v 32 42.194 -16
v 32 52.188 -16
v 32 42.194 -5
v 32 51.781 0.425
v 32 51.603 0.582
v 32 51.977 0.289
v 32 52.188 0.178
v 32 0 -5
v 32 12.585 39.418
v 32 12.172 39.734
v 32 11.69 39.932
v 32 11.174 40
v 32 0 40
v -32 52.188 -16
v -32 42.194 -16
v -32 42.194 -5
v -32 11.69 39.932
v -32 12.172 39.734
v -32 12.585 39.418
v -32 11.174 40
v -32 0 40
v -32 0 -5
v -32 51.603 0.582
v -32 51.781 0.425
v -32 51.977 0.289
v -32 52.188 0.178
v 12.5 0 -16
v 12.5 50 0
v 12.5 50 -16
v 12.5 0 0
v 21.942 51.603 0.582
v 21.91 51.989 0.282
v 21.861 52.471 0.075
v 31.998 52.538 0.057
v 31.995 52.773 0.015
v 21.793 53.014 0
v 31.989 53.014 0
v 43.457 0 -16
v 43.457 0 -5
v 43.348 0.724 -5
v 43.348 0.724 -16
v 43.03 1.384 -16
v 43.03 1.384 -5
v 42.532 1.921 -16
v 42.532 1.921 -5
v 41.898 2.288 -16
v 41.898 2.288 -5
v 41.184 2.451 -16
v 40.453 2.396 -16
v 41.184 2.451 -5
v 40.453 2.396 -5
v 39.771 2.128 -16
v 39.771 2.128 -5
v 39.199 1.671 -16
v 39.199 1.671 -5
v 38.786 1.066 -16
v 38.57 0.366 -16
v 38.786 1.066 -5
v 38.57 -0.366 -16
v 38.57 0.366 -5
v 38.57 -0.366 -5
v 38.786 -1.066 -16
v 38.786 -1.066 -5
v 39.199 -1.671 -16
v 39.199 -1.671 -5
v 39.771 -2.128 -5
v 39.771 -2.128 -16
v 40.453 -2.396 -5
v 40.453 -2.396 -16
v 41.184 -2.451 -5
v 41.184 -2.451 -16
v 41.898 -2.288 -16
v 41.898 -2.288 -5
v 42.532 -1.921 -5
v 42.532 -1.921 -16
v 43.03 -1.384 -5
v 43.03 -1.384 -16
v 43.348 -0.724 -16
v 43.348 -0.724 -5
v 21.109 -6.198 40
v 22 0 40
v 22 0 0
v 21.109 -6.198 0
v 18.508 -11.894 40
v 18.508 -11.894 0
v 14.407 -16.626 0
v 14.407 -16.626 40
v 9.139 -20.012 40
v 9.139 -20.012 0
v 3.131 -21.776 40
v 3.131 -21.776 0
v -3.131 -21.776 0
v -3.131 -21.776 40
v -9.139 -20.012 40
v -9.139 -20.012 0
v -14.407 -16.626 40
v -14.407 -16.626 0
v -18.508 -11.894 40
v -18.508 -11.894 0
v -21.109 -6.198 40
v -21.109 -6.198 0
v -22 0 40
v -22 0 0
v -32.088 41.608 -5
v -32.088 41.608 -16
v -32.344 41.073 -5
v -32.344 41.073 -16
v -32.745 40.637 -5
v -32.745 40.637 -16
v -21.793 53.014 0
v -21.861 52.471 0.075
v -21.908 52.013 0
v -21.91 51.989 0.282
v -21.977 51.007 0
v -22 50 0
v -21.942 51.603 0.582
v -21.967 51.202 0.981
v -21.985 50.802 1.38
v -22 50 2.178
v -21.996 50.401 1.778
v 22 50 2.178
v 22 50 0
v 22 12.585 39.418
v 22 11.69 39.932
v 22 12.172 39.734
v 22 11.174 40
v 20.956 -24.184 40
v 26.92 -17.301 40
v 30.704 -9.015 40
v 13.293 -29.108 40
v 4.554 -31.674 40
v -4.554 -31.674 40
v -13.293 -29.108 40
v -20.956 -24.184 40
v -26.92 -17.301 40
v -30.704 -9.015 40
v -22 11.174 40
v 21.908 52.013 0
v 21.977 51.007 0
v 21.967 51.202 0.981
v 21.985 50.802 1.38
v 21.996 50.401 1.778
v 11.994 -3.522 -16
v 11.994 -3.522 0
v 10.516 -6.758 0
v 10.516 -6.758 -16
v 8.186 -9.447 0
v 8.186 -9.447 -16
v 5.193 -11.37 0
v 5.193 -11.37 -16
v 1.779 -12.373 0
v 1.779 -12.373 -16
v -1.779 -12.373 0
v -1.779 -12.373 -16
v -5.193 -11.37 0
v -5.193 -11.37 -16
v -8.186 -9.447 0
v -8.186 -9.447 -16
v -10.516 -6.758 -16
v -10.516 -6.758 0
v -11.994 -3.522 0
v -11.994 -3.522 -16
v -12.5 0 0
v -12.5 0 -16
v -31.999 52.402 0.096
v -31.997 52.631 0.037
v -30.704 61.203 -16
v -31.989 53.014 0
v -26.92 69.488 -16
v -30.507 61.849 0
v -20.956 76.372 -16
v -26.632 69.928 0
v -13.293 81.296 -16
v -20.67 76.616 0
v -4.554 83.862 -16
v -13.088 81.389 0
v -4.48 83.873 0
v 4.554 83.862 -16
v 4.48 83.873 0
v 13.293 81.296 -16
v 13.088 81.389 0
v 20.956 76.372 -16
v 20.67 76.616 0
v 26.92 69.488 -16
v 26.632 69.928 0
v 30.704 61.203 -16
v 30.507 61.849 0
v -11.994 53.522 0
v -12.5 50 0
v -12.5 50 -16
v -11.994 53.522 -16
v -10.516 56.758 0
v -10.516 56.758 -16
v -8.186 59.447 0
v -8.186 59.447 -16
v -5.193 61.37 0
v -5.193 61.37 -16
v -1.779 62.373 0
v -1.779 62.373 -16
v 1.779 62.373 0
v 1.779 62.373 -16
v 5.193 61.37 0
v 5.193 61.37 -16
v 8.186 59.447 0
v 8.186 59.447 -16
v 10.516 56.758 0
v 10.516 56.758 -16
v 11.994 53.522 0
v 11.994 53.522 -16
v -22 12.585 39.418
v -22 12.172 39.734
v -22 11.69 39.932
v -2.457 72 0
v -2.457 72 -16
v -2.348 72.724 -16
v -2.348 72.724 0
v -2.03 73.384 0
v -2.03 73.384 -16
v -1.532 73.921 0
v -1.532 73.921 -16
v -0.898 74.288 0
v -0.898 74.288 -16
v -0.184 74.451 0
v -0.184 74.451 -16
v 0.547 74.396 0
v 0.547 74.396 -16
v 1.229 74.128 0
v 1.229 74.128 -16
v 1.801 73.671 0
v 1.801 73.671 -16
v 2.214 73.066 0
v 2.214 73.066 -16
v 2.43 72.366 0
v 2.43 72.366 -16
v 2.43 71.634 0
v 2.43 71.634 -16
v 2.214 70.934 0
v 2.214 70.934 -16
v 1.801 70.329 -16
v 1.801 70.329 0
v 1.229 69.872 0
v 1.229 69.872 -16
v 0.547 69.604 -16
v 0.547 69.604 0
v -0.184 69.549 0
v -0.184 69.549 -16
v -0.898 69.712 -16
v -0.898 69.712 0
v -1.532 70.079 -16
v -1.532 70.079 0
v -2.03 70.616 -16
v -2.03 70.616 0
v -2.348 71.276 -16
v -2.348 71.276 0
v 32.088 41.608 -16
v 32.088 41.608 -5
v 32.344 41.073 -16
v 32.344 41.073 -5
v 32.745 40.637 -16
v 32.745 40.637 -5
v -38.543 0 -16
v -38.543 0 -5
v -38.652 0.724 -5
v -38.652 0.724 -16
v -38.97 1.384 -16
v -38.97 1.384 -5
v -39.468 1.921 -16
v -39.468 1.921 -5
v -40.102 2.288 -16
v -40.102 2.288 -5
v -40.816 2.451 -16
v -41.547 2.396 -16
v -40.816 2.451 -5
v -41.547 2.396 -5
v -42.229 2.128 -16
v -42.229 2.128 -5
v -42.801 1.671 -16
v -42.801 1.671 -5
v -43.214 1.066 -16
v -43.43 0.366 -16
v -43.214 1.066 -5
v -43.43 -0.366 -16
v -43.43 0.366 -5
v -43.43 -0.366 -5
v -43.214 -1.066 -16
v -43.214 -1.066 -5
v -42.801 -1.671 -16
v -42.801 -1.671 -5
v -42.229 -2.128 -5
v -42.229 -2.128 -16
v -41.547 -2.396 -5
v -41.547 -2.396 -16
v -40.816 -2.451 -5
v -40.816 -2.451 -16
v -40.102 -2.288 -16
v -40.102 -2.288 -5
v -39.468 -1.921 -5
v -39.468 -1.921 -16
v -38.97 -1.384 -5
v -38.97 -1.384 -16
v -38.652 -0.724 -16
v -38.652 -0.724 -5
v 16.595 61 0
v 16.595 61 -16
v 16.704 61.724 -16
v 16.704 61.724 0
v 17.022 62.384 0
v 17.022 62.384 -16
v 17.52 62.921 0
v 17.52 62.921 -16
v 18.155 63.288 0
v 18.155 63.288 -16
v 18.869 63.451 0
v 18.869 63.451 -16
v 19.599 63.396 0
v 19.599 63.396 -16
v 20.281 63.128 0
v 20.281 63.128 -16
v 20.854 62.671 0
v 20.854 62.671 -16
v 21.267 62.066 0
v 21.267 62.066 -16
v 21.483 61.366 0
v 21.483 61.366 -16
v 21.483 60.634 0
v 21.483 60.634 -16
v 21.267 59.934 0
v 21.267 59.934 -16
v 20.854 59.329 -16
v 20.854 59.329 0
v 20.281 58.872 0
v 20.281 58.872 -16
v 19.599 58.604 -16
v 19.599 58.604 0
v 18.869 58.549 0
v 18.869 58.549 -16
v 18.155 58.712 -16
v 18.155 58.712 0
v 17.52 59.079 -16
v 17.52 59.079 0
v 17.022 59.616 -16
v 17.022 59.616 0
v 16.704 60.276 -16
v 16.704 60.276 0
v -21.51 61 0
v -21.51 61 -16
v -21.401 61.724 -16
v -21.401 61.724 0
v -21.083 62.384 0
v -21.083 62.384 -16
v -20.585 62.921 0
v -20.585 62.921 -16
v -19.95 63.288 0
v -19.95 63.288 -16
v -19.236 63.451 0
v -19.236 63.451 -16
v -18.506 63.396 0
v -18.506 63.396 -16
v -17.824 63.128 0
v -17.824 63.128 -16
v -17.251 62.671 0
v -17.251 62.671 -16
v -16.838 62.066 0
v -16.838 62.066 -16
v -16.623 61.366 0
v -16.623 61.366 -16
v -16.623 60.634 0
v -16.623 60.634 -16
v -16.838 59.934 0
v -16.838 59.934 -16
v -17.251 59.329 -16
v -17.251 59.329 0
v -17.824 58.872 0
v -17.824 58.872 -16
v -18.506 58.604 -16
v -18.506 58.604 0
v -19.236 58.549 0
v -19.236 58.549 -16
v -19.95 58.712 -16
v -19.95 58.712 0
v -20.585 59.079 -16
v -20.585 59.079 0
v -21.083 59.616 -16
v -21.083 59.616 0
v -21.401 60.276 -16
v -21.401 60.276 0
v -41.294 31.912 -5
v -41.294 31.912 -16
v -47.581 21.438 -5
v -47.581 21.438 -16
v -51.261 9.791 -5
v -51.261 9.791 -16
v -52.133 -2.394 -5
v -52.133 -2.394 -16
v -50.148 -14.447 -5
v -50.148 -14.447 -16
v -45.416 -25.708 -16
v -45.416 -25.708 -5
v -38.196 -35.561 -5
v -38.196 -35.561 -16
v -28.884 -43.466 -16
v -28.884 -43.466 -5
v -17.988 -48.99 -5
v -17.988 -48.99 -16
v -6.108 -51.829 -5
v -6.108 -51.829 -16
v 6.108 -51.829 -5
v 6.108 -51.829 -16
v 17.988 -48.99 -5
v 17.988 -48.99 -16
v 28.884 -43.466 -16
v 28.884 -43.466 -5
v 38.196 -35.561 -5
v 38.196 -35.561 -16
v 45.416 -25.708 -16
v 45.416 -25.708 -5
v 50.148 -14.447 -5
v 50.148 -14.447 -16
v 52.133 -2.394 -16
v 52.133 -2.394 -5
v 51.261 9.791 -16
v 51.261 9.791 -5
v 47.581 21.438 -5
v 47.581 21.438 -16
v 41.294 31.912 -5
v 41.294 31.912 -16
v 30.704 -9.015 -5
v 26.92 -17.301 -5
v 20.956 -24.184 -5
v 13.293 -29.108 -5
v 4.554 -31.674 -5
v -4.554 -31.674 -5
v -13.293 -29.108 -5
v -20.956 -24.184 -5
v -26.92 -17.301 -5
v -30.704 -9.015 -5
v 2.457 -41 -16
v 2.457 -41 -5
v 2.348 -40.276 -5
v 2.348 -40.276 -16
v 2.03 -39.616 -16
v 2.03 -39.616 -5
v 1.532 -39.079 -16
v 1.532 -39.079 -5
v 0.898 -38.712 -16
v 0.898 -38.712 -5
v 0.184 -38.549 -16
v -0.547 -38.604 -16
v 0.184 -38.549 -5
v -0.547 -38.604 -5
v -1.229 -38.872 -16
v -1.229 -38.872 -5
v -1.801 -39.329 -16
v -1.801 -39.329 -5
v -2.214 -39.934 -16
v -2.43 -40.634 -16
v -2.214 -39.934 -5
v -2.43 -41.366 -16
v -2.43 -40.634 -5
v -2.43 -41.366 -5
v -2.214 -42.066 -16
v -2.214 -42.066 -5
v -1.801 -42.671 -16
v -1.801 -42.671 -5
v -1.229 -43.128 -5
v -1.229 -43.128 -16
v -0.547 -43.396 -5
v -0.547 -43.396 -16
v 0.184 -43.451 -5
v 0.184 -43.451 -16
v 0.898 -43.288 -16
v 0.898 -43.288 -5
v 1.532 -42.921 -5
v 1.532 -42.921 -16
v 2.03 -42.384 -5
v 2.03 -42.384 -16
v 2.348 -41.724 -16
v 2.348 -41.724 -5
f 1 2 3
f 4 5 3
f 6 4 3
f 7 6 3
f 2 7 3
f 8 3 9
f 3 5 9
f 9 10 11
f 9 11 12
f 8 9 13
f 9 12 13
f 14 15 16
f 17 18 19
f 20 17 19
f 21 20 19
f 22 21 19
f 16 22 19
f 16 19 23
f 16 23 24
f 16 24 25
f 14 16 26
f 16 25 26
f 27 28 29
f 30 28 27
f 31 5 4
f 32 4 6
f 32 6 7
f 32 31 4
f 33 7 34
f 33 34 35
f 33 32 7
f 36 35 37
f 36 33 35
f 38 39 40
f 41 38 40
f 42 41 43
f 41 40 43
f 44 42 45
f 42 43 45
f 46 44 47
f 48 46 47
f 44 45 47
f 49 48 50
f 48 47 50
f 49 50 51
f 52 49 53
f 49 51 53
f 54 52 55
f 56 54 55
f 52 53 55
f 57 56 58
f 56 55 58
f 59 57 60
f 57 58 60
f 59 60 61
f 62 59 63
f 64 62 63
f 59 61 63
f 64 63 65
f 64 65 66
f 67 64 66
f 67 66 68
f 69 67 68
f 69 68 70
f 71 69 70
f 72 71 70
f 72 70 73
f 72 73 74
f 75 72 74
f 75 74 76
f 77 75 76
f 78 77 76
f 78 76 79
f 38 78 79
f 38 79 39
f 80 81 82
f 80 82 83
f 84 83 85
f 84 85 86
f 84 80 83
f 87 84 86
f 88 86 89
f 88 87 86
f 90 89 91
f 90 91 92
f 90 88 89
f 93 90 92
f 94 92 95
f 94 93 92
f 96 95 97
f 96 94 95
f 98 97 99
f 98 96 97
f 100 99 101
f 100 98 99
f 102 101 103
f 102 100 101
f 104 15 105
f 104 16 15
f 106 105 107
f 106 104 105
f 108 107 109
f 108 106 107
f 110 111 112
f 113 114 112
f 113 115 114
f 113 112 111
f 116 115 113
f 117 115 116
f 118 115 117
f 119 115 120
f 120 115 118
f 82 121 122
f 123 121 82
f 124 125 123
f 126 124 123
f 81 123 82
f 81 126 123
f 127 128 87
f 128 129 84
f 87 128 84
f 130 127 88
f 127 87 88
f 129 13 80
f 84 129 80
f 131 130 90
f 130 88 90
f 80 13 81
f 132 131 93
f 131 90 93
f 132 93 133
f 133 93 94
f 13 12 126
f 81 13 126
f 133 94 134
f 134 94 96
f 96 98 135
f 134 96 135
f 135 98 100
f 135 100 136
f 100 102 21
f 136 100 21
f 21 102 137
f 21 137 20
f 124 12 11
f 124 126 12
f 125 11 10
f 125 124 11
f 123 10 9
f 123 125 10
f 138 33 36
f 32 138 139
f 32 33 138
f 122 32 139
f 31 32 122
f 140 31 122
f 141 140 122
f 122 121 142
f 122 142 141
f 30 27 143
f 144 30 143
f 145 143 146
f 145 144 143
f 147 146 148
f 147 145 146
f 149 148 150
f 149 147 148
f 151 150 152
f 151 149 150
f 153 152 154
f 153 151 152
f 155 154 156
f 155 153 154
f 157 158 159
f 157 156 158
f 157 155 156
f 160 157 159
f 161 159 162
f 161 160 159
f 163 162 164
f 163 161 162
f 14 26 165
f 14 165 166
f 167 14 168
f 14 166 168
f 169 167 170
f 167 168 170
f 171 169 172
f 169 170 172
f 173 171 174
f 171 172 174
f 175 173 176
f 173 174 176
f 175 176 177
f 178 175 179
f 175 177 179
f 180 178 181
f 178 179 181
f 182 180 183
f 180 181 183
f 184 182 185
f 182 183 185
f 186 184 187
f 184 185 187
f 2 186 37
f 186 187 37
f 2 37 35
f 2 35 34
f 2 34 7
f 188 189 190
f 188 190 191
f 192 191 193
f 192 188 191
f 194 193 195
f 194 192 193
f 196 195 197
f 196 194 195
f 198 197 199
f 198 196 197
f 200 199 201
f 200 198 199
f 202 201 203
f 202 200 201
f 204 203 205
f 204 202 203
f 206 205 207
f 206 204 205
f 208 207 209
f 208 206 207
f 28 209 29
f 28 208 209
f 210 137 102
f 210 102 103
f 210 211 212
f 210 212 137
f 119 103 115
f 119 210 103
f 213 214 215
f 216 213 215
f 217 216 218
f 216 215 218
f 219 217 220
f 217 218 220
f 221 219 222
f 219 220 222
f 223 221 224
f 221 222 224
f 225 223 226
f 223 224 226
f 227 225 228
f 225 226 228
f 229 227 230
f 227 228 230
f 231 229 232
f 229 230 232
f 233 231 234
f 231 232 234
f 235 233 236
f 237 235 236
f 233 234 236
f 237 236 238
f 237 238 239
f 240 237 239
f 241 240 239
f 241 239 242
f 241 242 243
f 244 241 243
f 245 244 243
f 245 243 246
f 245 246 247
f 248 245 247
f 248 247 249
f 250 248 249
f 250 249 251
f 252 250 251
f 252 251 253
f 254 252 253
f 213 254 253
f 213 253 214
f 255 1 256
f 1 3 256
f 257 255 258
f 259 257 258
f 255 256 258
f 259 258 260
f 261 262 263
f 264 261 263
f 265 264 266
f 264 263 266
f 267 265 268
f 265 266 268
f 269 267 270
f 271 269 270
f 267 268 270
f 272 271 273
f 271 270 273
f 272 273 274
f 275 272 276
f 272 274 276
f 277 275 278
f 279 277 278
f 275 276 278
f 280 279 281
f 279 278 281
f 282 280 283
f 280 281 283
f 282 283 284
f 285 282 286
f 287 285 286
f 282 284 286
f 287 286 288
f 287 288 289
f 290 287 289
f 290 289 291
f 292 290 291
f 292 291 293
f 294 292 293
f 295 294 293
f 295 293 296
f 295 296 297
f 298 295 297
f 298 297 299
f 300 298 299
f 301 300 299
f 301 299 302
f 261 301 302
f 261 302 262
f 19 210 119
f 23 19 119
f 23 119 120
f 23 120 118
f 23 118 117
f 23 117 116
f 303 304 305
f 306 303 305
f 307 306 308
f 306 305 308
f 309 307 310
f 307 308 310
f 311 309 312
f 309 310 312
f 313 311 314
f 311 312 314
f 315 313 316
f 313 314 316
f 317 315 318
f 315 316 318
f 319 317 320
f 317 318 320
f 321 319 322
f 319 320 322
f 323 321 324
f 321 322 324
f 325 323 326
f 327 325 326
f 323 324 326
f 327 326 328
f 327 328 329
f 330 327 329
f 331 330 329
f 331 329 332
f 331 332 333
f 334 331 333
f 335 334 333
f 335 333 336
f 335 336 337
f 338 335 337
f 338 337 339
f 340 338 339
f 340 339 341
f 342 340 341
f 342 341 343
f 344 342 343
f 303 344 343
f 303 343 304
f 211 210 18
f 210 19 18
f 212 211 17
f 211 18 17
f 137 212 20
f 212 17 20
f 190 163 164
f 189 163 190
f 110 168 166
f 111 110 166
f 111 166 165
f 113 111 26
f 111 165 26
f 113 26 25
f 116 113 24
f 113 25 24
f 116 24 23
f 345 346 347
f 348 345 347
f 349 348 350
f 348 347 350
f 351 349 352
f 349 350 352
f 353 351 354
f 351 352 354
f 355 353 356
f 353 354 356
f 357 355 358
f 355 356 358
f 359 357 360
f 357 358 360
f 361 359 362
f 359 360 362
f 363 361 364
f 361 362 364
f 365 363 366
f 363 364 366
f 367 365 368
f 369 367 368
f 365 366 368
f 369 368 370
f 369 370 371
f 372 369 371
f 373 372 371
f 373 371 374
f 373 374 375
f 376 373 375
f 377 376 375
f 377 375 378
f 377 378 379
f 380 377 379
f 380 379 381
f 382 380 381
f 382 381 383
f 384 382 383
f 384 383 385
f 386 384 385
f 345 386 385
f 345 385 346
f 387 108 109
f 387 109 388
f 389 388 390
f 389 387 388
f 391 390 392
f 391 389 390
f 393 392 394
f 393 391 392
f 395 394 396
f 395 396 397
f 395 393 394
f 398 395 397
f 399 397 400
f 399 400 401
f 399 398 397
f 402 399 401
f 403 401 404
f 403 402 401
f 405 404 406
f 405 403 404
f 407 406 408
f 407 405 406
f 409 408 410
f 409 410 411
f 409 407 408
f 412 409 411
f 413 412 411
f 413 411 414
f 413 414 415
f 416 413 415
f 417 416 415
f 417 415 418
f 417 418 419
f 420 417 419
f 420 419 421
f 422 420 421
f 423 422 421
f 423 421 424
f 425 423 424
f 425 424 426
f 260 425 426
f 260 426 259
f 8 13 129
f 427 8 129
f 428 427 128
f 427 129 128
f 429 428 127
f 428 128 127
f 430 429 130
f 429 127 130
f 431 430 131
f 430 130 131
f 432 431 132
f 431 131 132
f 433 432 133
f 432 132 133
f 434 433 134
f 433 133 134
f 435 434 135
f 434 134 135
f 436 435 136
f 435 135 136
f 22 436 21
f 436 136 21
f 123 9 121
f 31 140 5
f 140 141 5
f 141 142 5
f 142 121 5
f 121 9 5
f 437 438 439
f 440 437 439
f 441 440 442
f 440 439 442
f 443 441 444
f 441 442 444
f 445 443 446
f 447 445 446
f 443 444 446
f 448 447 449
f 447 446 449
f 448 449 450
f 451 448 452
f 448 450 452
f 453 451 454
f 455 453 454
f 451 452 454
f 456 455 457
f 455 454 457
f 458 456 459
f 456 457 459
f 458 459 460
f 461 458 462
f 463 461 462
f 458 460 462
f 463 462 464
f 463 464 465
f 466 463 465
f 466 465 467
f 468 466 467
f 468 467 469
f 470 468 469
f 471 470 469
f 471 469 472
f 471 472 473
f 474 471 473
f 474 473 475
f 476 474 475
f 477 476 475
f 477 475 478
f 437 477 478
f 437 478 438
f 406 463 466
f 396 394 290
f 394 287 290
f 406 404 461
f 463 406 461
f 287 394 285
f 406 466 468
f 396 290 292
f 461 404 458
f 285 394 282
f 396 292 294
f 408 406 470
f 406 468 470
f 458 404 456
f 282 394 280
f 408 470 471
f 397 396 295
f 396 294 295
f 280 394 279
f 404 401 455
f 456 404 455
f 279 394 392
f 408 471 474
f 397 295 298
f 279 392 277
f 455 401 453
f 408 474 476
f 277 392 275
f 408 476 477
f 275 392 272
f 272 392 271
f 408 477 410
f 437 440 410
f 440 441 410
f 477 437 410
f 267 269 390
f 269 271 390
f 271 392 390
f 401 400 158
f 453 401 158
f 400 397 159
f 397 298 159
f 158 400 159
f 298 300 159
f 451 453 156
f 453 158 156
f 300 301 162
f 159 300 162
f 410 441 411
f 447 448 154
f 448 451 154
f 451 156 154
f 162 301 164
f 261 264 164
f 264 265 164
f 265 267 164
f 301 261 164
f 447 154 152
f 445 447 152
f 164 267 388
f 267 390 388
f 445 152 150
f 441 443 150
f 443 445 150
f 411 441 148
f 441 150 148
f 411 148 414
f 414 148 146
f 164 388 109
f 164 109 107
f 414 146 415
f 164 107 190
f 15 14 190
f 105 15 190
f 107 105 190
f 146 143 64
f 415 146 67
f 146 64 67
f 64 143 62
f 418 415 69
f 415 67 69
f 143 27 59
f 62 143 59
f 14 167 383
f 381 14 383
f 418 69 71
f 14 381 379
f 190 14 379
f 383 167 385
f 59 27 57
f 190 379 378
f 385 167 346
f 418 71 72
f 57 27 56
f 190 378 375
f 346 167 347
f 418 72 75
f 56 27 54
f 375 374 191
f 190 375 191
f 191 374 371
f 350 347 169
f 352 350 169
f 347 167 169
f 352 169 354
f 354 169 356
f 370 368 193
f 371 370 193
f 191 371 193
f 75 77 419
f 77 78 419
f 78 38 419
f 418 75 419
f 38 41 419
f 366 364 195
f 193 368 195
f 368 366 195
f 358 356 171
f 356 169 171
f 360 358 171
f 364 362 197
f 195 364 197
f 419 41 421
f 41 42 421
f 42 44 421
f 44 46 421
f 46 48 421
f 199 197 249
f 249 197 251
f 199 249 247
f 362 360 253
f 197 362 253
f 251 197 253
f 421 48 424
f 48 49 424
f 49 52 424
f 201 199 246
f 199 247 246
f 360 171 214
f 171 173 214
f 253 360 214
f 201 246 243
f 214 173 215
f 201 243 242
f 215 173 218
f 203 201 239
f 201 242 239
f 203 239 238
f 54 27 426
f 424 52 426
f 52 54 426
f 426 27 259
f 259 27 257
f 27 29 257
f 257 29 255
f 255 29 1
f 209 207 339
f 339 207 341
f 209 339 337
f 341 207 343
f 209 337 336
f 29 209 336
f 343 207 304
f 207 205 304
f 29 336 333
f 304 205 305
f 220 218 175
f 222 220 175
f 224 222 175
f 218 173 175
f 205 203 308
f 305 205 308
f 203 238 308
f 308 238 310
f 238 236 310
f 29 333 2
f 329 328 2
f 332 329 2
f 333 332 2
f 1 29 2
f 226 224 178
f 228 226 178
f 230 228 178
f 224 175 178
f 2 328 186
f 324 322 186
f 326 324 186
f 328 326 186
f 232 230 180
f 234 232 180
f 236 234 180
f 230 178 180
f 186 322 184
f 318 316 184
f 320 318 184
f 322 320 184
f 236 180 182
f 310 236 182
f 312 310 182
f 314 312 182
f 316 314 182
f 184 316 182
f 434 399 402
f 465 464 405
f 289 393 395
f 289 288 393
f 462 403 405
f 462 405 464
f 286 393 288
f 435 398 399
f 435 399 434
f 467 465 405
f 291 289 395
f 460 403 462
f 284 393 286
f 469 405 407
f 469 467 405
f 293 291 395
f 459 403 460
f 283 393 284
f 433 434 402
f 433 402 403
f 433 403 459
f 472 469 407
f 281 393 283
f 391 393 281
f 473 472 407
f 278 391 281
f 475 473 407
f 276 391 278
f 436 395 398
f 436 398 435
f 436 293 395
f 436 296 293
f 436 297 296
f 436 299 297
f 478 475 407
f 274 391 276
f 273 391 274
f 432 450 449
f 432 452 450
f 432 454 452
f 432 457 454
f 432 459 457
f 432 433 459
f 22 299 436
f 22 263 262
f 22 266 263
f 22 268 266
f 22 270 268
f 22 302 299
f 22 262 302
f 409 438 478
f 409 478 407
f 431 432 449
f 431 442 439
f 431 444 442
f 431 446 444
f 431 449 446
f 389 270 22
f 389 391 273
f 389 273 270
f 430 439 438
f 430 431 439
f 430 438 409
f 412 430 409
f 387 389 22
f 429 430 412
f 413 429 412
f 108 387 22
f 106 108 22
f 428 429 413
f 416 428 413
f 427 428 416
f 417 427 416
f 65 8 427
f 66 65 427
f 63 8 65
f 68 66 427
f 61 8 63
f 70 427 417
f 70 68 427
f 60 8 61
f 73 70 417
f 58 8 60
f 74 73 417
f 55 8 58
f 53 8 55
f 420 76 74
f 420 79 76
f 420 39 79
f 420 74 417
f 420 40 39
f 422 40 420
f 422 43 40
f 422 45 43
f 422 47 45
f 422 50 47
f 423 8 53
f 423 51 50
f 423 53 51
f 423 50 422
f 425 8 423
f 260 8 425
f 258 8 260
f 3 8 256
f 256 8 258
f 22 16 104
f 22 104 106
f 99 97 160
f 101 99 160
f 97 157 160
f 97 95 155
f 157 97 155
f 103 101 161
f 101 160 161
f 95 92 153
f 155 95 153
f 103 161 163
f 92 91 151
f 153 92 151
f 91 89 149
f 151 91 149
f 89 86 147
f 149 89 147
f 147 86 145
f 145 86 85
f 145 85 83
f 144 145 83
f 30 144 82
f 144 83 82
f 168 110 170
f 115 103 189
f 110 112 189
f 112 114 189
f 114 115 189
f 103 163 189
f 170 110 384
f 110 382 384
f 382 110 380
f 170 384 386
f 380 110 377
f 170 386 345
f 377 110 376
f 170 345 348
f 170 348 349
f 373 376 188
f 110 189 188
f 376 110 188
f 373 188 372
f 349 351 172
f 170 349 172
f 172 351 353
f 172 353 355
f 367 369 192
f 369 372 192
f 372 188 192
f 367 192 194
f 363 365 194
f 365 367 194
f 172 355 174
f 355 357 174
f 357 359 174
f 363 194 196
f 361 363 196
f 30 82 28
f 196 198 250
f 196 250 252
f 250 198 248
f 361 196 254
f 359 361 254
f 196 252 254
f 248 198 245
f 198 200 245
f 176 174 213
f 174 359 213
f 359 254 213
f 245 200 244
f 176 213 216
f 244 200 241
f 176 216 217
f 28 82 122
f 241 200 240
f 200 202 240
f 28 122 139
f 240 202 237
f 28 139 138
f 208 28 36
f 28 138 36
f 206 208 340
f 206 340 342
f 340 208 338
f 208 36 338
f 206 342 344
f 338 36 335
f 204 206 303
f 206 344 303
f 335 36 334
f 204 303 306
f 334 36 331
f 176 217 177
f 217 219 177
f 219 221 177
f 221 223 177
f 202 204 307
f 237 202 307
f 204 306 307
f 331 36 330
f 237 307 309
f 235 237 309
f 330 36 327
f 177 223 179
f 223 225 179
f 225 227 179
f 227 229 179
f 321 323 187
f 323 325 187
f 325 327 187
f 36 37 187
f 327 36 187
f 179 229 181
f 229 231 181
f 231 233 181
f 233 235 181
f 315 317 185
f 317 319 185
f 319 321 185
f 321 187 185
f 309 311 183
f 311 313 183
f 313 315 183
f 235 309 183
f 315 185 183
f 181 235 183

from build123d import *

# Parameters (mm, degrees)
BOSS_EXTRUDE1_DEPTH          = 40
BOSS_EXTRUDE1_DEPTH_BACK     = 16
BOSS_EXTRUDE2_START          = -5
SKETCH1_3_R                  = 52.187837327
BOSS_EXTRUDE2_DEPTH          = 11
CUT_EXTRUDE1_DEPTH           = 114.785598028
CUT_EXTRUDE3_DEPTH           = 40
CUT_EXTRUDE4_DEPTH           = 126.599298993
FILLET1_R                    = 2
F_10_0_1935_DIAMETER_HOLE3_D = 4.9149
F_10_0_1935_DIAMETER_HOLE4_D = 4.9149
FILLET2_R                    = 2
FILLET3_R                    = 2


with BuildPart() as part:
    # Sketch1 → Boss-Extrude1 (new, two sides: drawn at the far end of the back side and taken through both)
    with BuildSketch(Plane.XY.offset(-BOSS_EXTRUDE1_DEPTH_BACK)):
        with BuildLine():
            ThreePointArc((-32, 0), (0, -32), (32, 0))
            Line((32, 0), (32, 52.187837327))
            ThreePointArc((32, 52.187837327), (0, 84.187837327), (-32, 52.187837327))
            Line((-32, 52.187837327), (-32, 0))
        make_face()
    extrude(amount=BOSS_EXTRUDE1_DEPTH + BOSS_EXTRUDE1_DEPTH_BACK)

    # Sketch1<3> → Boss-Extrude2 (add)
    with BuildSketch(Plane.XY.offset(BOSS_EXTRUDE2_START)):
        Circle(SKETCH1_3_R)
    extrude(amount=-BOSS_EXTRUDE2_DEPTH)

    # Sketch2 → Cut-Extrude1 (cut, through all)
    with BuildSketch(Plane.XY.offset(40)):
        with BuildLine():
            Line((-12.5, 0), (-12.5, 50))
            ThreePointArc((-12.5, 50), (0, 62.5), (12.5, 50))
            Line((12.5, 50), (12.5, 0))
            ThreePointArc((12.5, 0), (0, -12.5), (-12.5, 0))
        make_face()
    extrude(amount=-CUT_EXTRUDE1_DEPTH, mode=Mode.SUBTRACT)

    # Sketch6 → Cut-Extrude3 (cut)
    with BuildSketch(Plane.XY.offset(40)):
        with BuildLine():
            Line((-22, 0), (-22, 50))
            ThreePointArc((-22, 50), (0, 72), (22, 50))
            Line((22, 50), (22, 0))
            ThreePointArc((22, 0), (0, -22), (-22, 0))
        make_face()
    extrude(amount=-CUT_EXTRUDE3_DEPTH, mode=Mode.SUBTRACT)

    # Sketch7 → Cut-Extrude4 (cut, through all)
    with BuildSketch(Plane(origin=(32, 0, 0), x_dir=(0, 0, -1), z_dir=(1, 0, 0))):
        Polygon((0, 52.187837327), (0, 84.187837327), (-40, 84.187837327), (-40, 12), align=None)
    extrude(amount=-CUT_EXTRUDE4_DEPTH, mode=Mode.SUBTRACT)

    # Fillet1
    fillet1_edges = [part.edges().sort_by_distance(p)[0] for p in [
        (27, 12, 40),
        (-27, 12, 40),
    ]]
    fillet(fillet1_edges, radius=FILLET1_R)

    # #10 (0.1935) Diameter Hole3 (through all)
    with Locations(Plane.XY):
        with Locations((-19.052558883, 61), (19.052558883, 61), (0, 72)):
            Hole(F_10_0_1935_DIAMETER_HOLE3_D / 2)

    # #10 (0.1935) Diameter Hole4 (through all)
    with Locations(Plane(origin=(0, 0, -16), x_dir=(-1, 0, 0), z_dir=(0, 0, -1))):
        with Locations((0, -41), (41, 0), (-41, 0)):
            Hole(F_10_0_1935_DIAMETER_HOLE4_D / 2)

    # Fillet2
    fillet2_edges = [part.edges().sort_by_distance(p)[0] for p in [
        (26.945471299, 52.187837327, 0),
        (-26.945471299, 52.187837327, 0),
    ]]
    fillet(fillet2_edges, radius=FILLET2_R)

    # Fillet3
    fillet3_edges = [part.edges().sort_by_distance(p)[0] for p in [
        (-32, 41.225845835, -10.5),
        (32, 41.225845835, -10.5),
    ]]
    fillet(fillet3_edges, radius=FILLET3_R)


solid = part.part
